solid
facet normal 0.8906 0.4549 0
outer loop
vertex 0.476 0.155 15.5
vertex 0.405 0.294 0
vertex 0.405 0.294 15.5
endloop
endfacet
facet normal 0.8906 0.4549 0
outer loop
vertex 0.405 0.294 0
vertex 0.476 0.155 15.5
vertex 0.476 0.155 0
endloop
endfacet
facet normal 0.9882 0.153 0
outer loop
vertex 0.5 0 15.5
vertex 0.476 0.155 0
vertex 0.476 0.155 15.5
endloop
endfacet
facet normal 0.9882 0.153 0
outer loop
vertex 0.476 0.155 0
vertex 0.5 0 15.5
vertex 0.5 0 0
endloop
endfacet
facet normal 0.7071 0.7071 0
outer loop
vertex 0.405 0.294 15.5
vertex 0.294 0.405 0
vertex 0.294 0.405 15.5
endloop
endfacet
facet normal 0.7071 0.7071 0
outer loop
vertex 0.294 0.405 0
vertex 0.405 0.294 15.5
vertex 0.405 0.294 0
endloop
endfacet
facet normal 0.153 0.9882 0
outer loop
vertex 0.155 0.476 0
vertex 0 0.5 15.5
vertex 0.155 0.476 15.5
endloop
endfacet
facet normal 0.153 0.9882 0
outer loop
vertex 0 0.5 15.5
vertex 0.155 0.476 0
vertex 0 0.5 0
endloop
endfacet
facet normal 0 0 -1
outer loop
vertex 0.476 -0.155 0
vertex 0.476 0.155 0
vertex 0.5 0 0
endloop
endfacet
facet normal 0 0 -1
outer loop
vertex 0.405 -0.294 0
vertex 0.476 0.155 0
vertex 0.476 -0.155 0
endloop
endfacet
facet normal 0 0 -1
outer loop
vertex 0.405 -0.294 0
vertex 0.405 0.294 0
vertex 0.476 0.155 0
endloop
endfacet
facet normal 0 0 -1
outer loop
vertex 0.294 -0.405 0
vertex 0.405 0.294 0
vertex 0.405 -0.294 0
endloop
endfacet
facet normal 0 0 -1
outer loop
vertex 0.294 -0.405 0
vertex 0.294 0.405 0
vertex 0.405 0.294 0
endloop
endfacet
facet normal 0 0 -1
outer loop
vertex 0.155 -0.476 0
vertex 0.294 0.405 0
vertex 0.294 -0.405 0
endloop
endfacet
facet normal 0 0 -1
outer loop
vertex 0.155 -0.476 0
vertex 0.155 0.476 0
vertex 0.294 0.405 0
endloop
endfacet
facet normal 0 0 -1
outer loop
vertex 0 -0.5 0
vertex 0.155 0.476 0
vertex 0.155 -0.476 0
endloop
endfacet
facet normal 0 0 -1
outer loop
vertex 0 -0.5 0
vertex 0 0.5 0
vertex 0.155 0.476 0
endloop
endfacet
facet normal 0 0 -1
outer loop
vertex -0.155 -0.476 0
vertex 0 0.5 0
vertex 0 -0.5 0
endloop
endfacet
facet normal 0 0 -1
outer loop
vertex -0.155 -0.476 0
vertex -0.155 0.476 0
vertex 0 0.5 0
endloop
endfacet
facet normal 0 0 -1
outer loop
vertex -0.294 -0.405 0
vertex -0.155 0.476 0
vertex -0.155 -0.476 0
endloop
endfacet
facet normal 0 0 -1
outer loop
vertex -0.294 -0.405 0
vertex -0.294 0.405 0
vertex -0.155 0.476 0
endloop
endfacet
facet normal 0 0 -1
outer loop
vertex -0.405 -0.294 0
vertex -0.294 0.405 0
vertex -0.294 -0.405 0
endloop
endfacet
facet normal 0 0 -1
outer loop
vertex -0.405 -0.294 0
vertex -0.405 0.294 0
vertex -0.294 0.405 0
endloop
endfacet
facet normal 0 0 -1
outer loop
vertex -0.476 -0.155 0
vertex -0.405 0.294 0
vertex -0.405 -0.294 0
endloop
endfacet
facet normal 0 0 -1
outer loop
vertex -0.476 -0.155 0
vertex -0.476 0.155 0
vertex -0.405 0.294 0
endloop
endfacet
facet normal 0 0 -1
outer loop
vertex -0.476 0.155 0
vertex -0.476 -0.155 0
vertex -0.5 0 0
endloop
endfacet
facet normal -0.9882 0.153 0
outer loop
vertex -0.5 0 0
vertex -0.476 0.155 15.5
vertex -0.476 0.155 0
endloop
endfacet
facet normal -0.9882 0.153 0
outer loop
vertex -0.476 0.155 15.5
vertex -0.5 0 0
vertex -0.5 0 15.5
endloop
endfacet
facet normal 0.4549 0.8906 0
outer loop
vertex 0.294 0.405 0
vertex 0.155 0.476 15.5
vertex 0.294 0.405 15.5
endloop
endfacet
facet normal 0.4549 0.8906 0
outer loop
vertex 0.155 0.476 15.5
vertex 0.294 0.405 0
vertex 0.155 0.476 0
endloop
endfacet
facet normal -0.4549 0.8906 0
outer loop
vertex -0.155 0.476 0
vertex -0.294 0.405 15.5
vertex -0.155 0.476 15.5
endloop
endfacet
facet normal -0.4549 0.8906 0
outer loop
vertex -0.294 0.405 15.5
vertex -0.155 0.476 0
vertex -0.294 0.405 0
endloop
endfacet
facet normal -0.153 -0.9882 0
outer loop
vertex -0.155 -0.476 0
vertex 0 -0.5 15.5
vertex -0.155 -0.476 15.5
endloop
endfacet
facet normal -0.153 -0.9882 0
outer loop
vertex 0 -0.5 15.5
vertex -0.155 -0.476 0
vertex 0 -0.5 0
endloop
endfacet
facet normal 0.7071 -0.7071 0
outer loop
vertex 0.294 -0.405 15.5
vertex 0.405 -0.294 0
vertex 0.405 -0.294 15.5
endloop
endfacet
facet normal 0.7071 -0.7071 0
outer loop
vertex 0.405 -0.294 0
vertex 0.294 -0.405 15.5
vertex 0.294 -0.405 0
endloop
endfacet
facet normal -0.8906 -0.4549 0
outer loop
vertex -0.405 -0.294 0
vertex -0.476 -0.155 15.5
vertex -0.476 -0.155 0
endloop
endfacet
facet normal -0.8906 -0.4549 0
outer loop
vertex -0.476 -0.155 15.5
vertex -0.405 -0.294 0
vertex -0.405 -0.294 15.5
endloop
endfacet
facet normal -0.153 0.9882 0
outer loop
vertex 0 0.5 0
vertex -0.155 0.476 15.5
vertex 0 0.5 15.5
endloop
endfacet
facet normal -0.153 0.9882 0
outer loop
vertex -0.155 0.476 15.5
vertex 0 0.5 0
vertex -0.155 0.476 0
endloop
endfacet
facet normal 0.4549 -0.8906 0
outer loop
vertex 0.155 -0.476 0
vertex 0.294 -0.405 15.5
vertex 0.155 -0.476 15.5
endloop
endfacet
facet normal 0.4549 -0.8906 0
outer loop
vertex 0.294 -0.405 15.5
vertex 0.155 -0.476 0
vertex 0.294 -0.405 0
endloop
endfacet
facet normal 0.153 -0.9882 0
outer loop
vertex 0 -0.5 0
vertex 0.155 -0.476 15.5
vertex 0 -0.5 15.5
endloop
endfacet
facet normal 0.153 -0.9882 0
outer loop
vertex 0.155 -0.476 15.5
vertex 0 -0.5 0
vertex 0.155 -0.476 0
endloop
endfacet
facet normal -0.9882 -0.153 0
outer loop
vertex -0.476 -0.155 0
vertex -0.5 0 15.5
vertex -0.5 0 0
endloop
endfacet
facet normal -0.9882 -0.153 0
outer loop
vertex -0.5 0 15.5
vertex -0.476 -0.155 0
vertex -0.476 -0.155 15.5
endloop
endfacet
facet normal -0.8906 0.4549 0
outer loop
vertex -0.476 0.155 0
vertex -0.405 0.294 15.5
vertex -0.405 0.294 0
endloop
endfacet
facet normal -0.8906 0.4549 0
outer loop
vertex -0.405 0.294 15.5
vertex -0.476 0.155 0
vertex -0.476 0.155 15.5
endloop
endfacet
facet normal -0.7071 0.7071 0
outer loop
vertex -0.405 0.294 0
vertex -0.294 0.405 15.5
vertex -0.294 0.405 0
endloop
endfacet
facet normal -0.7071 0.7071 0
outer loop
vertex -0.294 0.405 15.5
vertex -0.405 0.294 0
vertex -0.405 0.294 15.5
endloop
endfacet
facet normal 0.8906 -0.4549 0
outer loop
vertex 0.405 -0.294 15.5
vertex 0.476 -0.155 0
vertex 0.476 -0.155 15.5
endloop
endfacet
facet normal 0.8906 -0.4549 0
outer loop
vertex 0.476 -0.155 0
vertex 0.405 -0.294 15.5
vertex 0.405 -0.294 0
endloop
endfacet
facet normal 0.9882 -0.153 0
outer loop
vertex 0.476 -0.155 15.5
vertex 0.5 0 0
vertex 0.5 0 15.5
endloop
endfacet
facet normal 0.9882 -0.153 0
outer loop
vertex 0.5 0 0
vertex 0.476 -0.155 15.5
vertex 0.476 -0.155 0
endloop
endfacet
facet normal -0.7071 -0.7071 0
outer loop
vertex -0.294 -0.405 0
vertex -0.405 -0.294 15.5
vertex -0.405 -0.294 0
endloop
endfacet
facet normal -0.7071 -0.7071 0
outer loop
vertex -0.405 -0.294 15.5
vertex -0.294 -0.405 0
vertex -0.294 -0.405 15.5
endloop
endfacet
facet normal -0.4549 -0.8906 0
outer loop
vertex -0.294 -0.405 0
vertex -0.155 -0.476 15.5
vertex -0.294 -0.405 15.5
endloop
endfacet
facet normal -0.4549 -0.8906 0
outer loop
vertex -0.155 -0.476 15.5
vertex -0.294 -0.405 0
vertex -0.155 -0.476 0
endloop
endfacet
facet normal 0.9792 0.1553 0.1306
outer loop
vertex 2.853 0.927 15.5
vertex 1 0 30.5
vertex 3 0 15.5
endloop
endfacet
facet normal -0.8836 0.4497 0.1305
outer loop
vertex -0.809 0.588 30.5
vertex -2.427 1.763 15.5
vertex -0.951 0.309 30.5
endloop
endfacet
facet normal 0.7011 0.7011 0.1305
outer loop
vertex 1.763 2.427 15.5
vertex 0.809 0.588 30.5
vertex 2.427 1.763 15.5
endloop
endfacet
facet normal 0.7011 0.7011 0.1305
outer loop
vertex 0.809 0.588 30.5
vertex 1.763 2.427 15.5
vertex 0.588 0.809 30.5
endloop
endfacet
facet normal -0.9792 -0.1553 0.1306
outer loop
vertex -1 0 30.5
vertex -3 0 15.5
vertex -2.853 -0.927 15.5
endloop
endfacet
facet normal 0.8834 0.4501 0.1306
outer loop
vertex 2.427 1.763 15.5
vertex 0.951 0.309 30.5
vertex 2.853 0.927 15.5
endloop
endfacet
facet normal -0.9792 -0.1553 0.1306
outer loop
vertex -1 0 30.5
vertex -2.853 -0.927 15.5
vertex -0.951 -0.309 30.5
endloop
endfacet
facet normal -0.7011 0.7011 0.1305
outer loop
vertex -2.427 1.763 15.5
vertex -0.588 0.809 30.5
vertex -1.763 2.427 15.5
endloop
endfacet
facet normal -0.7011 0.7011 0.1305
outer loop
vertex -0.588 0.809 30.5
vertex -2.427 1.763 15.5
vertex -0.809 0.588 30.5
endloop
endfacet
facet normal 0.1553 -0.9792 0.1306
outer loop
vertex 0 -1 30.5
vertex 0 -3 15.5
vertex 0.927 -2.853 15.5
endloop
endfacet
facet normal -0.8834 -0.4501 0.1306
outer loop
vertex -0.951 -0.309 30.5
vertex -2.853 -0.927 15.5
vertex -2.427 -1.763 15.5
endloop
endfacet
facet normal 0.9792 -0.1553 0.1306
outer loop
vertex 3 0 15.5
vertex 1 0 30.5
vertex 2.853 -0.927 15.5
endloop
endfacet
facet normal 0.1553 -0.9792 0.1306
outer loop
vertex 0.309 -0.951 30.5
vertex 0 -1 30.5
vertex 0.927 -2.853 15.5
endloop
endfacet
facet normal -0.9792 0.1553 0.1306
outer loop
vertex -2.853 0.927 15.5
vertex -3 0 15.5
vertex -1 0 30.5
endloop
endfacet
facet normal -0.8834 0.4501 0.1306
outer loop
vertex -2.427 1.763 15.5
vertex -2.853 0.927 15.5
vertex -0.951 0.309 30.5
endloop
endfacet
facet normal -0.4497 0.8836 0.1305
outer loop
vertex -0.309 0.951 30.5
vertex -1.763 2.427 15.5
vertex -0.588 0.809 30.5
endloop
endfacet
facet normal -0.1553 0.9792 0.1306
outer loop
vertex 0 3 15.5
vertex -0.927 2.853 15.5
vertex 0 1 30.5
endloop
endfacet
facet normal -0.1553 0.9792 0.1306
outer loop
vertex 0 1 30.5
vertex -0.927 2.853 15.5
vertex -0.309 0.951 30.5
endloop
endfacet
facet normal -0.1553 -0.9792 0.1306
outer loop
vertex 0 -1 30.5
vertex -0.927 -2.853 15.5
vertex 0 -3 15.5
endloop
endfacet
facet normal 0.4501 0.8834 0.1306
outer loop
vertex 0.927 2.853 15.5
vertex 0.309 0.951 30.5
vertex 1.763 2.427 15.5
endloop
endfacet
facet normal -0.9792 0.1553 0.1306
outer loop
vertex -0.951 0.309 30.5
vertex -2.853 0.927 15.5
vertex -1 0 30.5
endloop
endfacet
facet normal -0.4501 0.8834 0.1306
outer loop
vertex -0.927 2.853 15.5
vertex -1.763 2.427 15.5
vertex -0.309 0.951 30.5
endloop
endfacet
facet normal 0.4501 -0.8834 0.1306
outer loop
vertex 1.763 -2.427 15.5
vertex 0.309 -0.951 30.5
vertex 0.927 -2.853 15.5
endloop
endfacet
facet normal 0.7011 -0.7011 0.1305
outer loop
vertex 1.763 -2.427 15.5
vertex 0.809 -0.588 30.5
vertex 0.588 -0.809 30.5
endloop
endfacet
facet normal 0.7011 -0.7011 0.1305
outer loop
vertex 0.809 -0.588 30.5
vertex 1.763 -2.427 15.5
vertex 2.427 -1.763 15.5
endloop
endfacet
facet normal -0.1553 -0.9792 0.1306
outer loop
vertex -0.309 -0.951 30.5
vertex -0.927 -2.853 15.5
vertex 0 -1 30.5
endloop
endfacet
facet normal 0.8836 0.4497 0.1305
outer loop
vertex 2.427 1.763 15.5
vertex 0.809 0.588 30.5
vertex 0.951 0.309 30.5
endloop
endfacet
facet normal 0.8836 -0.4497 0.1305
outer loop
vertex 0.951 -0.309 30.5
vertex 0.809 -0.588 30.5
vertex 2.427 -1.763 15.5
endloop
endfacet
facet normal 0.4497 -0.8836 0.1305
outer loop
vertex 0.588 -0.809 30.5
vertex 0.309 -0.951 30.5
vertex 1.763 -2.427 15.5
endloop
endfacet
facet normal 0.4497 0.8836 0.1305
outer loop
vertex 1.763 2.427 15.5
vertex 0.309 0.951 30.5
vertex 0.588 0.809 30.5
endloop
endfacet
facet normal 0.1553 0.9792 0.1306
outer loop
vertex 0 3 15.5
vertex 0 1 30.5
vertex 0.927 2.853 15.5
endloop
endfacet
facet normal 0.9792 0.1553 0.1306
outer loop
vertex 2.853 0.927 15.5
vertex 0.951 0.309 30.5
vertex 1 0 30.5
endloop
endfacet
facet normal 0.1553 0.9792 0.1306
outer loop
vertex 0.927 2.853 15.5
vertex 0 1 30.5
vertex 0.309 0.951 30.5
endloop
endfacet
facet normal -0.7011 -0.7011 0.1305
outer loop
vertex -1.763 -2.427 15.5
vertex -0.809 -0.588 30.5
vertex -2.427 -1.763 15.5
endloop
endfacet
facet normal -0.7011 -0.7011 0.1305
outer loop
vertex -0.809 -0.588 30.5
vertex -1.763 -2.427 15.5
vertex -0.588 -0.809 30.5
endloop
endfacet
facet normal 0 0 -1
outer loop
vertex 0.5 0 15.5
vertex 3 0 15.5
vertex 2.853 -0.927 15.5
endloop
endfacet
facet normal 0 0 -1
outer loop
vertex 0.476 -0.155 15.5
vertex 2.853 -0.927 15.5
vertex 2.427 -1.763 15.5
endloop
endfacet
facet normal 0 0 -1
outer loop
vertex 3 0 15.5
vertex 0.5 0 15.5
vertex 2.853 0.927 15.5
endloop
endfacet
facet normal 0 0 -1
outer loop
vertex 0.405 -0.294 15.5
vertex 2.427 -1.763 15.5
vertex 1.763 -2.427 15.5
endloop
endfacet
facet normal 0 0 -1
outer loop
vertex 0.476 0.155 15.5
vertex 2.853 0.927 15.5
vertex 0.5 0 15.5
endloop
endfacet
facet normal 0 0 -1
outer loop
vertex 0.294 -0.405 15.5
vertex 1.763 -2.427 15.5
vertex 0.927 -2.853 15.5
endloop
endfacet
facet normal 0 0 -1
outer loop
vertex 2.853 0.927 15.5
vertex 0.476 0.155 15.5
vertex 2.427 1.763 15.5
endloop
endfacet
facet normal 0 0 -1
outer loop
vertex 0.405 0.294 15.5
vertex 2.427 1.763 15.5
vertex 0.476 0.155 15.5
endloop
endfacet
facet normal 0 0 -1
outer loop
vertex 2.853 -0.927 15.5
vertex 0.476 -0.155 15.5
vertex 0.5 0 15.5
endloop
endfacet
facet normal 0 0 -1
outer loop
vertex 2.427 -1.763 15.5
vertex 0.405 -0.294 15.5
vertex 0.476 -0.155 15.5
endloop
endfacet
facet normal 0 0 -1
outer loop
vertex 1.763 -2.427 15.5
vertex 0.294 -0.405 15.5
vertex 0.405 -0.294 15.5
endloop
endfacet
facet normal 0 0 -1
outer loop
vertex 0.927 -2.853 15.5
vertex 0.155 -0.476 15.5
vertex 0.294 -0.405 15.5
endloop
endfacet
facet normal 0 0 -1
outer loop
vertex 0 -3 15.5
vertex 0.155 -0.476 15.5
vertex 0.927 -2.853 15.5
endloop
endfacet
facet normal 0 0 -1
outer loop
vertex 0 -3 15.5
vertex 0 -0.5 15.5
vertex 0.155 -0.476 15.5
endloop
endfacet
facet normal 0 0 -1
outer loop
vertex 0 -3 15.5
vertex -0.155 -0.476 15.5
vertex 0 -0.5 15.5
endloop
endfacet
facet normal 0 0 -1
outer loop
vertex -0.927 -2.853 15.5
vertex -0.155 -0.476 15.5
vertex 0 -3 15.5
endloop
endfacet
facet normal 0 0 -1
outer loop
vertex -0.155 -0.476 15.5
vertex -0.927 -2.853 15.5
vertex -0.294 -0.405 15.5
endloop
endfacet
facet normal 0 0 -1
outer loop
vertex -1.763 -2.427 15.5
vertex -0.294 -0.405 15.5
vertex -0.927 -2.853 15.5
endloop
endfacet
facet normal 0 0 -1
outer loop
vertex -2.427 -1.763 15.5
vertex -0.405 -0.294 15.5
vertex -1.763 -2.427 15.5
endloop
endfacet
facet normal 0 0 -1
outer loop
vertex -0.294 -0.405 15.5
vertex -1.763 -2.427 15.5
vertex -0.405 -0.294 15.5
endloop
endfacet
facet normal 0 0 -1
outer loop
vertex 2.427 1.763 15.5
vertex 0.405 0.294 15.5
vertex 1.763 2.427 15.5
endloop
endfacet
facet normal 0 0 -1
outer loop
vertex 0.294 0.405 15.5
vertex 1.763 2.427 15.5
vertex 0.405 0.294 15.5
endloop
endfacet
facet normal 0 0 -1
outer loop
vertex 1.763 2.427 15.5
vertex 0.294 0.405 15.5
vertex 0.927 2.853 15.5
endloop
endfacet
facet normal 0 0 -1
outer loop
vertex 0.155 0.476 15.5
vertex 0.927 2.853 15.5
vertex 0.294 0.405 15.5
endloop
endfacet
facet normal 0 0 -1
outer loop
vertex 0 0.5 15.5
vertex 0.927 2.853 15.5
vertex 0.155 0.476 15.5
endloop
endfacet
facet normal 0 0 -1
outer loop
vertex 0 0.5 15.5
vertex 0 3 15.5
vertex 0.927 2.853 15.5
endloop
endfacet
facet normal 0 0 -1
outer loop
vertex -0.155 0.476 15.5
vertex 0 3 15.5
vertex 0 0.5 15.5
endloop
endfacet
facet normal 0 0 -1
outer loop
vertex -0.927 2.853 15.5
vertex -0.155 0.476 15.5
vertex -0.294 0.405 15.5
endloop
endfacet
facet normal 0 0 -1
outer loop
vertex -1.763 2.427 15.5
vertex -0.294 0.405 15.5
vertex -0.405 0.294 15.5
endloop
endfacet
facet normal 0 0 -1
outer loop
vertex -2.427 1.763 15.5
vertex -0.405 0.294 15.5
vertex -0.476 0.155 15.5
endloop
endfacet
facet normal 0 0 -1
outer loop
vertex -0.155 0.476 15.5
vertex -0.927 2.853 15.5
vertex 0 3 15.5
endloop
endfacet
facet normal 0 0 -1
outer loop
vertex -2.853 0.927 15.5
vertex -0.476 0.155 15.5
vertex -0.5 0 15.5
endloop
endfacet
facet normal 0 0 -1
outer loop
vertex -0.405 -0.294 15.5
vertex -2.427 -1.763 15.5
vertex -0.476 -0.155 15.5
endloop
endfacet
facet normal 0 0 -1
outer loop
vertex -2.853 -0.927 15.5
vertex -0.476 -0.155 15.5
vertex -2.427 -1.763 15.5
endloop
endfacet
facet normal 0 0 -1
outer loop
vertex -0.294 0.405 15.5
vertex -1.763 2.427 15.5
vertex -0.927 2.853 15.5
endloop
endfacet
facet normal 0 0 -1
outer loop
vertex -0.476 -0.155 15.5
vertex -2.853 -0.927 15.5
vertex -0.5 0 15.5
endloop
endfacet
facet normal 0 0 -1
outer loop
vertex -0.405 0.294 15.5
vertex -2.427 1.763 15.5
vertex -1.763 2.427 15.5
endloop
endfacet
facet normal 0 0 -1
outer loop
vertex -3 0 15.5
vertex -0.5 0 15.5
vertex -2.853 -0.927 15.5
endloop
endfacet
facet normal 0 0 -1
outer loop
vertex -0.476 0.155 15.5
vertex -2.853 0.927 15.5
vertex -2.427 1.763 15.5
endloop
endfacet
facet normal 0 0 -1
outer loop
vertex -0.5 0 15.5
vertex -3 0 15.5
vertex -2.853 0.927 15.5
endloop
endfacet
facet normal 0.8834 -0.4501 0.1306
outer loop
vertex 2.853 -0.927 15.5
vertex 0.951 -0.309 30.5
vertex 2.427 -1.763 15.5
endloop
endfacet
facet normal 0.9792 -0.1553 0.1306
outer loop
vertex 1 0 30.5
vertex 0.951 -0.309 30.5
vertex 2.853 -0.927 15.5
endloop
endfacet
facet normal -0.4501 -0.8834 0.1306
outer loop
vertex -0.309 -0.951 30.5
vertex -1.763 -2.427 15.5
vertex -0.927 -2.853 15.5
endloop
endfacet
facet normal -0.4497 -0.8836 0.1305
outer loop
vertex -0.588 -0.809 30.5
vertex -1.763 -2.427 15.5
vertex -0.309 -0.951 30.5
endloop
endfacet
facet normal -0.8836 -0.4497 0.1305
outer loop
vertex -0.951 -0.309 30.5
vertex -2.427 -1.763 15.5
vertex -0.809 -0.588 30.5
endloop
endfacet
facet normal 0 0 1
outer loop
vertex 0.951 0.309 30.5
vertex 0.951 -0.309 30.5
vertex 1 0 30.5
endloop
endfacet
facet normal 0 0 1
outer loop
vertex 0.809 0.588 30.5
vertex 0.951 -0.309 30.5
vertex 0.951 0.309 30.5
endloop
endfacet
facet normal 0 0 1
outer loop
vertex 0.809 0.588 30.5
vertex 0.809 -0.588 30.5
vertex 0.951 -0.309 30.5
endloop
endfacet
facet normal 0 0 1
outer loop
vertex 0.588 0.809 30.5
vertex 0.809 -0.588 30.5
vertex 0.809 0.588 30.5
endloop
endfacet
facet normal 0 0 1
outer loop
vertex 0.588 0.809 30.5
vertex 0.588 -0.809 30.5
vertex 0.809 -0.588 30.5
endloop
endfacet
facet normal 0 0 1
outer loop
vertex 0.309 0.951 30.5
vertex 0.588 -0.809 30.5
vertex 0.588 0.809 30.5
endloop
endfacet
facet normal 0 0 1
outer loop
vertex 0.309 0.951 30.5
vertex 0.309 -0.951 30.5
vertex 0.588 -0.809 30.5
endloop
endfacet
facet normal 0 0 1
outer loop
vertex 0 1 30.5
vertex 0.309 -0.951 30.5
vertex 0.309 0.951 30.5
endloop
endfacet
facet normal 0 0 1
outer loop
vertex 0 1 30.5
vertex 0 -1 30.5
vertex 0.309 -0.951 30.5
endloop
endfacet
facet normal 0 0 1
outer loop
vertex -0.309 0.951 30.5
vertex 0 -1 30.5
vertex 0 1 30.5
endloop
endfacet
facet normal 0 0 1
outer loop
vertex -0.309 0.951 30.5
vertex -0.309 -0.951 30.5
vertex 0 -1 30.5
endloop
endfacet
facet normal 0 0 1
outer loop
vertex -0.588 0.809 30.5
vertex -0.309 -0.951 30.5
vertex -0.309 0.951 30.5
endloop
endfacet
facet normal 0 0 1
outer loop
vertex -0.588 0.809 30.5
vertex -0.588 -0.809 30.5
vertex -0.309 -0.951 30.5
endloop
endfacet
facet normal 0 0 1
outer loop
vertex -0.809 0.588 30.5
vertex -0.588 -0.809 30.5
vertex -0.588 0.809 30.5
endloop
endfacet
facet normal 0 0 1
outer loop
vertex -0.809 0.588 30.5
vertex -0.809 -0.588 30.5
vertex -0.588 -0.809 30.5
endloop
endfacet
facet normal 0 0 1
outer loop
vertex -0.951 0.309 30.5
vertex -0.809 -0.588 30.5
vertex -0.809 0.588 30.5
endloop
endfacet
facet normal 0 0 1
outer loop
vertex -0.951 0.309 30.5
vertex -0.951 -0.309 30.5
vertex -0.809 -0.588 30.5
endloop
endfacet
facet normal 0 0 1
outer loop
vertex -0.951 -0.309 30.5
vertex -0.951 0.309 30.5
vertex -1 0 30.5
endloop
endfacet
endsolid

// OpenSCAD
popsicle = true;
biglol = false;
roundlol = false;

//stick
cylinder(h=20, r=.5, $fn=20); 

//makes it a popsicle
if(popsicle == true){
translate([0,0,23]) cylinder(h=15, r1=3, r2=1, $fn=20, center=true);
}

//makes it a big lollipop
if(biglol == true){
translate([0,0,20]) rotate([90,90,0]) cylinder(h=1, r=5, $fn=20, center=true);
}

//makes it a round lollipop
if(roundlol == true){
translate([0,0,20]) sphere(4,$fn=20, center=true);
}
